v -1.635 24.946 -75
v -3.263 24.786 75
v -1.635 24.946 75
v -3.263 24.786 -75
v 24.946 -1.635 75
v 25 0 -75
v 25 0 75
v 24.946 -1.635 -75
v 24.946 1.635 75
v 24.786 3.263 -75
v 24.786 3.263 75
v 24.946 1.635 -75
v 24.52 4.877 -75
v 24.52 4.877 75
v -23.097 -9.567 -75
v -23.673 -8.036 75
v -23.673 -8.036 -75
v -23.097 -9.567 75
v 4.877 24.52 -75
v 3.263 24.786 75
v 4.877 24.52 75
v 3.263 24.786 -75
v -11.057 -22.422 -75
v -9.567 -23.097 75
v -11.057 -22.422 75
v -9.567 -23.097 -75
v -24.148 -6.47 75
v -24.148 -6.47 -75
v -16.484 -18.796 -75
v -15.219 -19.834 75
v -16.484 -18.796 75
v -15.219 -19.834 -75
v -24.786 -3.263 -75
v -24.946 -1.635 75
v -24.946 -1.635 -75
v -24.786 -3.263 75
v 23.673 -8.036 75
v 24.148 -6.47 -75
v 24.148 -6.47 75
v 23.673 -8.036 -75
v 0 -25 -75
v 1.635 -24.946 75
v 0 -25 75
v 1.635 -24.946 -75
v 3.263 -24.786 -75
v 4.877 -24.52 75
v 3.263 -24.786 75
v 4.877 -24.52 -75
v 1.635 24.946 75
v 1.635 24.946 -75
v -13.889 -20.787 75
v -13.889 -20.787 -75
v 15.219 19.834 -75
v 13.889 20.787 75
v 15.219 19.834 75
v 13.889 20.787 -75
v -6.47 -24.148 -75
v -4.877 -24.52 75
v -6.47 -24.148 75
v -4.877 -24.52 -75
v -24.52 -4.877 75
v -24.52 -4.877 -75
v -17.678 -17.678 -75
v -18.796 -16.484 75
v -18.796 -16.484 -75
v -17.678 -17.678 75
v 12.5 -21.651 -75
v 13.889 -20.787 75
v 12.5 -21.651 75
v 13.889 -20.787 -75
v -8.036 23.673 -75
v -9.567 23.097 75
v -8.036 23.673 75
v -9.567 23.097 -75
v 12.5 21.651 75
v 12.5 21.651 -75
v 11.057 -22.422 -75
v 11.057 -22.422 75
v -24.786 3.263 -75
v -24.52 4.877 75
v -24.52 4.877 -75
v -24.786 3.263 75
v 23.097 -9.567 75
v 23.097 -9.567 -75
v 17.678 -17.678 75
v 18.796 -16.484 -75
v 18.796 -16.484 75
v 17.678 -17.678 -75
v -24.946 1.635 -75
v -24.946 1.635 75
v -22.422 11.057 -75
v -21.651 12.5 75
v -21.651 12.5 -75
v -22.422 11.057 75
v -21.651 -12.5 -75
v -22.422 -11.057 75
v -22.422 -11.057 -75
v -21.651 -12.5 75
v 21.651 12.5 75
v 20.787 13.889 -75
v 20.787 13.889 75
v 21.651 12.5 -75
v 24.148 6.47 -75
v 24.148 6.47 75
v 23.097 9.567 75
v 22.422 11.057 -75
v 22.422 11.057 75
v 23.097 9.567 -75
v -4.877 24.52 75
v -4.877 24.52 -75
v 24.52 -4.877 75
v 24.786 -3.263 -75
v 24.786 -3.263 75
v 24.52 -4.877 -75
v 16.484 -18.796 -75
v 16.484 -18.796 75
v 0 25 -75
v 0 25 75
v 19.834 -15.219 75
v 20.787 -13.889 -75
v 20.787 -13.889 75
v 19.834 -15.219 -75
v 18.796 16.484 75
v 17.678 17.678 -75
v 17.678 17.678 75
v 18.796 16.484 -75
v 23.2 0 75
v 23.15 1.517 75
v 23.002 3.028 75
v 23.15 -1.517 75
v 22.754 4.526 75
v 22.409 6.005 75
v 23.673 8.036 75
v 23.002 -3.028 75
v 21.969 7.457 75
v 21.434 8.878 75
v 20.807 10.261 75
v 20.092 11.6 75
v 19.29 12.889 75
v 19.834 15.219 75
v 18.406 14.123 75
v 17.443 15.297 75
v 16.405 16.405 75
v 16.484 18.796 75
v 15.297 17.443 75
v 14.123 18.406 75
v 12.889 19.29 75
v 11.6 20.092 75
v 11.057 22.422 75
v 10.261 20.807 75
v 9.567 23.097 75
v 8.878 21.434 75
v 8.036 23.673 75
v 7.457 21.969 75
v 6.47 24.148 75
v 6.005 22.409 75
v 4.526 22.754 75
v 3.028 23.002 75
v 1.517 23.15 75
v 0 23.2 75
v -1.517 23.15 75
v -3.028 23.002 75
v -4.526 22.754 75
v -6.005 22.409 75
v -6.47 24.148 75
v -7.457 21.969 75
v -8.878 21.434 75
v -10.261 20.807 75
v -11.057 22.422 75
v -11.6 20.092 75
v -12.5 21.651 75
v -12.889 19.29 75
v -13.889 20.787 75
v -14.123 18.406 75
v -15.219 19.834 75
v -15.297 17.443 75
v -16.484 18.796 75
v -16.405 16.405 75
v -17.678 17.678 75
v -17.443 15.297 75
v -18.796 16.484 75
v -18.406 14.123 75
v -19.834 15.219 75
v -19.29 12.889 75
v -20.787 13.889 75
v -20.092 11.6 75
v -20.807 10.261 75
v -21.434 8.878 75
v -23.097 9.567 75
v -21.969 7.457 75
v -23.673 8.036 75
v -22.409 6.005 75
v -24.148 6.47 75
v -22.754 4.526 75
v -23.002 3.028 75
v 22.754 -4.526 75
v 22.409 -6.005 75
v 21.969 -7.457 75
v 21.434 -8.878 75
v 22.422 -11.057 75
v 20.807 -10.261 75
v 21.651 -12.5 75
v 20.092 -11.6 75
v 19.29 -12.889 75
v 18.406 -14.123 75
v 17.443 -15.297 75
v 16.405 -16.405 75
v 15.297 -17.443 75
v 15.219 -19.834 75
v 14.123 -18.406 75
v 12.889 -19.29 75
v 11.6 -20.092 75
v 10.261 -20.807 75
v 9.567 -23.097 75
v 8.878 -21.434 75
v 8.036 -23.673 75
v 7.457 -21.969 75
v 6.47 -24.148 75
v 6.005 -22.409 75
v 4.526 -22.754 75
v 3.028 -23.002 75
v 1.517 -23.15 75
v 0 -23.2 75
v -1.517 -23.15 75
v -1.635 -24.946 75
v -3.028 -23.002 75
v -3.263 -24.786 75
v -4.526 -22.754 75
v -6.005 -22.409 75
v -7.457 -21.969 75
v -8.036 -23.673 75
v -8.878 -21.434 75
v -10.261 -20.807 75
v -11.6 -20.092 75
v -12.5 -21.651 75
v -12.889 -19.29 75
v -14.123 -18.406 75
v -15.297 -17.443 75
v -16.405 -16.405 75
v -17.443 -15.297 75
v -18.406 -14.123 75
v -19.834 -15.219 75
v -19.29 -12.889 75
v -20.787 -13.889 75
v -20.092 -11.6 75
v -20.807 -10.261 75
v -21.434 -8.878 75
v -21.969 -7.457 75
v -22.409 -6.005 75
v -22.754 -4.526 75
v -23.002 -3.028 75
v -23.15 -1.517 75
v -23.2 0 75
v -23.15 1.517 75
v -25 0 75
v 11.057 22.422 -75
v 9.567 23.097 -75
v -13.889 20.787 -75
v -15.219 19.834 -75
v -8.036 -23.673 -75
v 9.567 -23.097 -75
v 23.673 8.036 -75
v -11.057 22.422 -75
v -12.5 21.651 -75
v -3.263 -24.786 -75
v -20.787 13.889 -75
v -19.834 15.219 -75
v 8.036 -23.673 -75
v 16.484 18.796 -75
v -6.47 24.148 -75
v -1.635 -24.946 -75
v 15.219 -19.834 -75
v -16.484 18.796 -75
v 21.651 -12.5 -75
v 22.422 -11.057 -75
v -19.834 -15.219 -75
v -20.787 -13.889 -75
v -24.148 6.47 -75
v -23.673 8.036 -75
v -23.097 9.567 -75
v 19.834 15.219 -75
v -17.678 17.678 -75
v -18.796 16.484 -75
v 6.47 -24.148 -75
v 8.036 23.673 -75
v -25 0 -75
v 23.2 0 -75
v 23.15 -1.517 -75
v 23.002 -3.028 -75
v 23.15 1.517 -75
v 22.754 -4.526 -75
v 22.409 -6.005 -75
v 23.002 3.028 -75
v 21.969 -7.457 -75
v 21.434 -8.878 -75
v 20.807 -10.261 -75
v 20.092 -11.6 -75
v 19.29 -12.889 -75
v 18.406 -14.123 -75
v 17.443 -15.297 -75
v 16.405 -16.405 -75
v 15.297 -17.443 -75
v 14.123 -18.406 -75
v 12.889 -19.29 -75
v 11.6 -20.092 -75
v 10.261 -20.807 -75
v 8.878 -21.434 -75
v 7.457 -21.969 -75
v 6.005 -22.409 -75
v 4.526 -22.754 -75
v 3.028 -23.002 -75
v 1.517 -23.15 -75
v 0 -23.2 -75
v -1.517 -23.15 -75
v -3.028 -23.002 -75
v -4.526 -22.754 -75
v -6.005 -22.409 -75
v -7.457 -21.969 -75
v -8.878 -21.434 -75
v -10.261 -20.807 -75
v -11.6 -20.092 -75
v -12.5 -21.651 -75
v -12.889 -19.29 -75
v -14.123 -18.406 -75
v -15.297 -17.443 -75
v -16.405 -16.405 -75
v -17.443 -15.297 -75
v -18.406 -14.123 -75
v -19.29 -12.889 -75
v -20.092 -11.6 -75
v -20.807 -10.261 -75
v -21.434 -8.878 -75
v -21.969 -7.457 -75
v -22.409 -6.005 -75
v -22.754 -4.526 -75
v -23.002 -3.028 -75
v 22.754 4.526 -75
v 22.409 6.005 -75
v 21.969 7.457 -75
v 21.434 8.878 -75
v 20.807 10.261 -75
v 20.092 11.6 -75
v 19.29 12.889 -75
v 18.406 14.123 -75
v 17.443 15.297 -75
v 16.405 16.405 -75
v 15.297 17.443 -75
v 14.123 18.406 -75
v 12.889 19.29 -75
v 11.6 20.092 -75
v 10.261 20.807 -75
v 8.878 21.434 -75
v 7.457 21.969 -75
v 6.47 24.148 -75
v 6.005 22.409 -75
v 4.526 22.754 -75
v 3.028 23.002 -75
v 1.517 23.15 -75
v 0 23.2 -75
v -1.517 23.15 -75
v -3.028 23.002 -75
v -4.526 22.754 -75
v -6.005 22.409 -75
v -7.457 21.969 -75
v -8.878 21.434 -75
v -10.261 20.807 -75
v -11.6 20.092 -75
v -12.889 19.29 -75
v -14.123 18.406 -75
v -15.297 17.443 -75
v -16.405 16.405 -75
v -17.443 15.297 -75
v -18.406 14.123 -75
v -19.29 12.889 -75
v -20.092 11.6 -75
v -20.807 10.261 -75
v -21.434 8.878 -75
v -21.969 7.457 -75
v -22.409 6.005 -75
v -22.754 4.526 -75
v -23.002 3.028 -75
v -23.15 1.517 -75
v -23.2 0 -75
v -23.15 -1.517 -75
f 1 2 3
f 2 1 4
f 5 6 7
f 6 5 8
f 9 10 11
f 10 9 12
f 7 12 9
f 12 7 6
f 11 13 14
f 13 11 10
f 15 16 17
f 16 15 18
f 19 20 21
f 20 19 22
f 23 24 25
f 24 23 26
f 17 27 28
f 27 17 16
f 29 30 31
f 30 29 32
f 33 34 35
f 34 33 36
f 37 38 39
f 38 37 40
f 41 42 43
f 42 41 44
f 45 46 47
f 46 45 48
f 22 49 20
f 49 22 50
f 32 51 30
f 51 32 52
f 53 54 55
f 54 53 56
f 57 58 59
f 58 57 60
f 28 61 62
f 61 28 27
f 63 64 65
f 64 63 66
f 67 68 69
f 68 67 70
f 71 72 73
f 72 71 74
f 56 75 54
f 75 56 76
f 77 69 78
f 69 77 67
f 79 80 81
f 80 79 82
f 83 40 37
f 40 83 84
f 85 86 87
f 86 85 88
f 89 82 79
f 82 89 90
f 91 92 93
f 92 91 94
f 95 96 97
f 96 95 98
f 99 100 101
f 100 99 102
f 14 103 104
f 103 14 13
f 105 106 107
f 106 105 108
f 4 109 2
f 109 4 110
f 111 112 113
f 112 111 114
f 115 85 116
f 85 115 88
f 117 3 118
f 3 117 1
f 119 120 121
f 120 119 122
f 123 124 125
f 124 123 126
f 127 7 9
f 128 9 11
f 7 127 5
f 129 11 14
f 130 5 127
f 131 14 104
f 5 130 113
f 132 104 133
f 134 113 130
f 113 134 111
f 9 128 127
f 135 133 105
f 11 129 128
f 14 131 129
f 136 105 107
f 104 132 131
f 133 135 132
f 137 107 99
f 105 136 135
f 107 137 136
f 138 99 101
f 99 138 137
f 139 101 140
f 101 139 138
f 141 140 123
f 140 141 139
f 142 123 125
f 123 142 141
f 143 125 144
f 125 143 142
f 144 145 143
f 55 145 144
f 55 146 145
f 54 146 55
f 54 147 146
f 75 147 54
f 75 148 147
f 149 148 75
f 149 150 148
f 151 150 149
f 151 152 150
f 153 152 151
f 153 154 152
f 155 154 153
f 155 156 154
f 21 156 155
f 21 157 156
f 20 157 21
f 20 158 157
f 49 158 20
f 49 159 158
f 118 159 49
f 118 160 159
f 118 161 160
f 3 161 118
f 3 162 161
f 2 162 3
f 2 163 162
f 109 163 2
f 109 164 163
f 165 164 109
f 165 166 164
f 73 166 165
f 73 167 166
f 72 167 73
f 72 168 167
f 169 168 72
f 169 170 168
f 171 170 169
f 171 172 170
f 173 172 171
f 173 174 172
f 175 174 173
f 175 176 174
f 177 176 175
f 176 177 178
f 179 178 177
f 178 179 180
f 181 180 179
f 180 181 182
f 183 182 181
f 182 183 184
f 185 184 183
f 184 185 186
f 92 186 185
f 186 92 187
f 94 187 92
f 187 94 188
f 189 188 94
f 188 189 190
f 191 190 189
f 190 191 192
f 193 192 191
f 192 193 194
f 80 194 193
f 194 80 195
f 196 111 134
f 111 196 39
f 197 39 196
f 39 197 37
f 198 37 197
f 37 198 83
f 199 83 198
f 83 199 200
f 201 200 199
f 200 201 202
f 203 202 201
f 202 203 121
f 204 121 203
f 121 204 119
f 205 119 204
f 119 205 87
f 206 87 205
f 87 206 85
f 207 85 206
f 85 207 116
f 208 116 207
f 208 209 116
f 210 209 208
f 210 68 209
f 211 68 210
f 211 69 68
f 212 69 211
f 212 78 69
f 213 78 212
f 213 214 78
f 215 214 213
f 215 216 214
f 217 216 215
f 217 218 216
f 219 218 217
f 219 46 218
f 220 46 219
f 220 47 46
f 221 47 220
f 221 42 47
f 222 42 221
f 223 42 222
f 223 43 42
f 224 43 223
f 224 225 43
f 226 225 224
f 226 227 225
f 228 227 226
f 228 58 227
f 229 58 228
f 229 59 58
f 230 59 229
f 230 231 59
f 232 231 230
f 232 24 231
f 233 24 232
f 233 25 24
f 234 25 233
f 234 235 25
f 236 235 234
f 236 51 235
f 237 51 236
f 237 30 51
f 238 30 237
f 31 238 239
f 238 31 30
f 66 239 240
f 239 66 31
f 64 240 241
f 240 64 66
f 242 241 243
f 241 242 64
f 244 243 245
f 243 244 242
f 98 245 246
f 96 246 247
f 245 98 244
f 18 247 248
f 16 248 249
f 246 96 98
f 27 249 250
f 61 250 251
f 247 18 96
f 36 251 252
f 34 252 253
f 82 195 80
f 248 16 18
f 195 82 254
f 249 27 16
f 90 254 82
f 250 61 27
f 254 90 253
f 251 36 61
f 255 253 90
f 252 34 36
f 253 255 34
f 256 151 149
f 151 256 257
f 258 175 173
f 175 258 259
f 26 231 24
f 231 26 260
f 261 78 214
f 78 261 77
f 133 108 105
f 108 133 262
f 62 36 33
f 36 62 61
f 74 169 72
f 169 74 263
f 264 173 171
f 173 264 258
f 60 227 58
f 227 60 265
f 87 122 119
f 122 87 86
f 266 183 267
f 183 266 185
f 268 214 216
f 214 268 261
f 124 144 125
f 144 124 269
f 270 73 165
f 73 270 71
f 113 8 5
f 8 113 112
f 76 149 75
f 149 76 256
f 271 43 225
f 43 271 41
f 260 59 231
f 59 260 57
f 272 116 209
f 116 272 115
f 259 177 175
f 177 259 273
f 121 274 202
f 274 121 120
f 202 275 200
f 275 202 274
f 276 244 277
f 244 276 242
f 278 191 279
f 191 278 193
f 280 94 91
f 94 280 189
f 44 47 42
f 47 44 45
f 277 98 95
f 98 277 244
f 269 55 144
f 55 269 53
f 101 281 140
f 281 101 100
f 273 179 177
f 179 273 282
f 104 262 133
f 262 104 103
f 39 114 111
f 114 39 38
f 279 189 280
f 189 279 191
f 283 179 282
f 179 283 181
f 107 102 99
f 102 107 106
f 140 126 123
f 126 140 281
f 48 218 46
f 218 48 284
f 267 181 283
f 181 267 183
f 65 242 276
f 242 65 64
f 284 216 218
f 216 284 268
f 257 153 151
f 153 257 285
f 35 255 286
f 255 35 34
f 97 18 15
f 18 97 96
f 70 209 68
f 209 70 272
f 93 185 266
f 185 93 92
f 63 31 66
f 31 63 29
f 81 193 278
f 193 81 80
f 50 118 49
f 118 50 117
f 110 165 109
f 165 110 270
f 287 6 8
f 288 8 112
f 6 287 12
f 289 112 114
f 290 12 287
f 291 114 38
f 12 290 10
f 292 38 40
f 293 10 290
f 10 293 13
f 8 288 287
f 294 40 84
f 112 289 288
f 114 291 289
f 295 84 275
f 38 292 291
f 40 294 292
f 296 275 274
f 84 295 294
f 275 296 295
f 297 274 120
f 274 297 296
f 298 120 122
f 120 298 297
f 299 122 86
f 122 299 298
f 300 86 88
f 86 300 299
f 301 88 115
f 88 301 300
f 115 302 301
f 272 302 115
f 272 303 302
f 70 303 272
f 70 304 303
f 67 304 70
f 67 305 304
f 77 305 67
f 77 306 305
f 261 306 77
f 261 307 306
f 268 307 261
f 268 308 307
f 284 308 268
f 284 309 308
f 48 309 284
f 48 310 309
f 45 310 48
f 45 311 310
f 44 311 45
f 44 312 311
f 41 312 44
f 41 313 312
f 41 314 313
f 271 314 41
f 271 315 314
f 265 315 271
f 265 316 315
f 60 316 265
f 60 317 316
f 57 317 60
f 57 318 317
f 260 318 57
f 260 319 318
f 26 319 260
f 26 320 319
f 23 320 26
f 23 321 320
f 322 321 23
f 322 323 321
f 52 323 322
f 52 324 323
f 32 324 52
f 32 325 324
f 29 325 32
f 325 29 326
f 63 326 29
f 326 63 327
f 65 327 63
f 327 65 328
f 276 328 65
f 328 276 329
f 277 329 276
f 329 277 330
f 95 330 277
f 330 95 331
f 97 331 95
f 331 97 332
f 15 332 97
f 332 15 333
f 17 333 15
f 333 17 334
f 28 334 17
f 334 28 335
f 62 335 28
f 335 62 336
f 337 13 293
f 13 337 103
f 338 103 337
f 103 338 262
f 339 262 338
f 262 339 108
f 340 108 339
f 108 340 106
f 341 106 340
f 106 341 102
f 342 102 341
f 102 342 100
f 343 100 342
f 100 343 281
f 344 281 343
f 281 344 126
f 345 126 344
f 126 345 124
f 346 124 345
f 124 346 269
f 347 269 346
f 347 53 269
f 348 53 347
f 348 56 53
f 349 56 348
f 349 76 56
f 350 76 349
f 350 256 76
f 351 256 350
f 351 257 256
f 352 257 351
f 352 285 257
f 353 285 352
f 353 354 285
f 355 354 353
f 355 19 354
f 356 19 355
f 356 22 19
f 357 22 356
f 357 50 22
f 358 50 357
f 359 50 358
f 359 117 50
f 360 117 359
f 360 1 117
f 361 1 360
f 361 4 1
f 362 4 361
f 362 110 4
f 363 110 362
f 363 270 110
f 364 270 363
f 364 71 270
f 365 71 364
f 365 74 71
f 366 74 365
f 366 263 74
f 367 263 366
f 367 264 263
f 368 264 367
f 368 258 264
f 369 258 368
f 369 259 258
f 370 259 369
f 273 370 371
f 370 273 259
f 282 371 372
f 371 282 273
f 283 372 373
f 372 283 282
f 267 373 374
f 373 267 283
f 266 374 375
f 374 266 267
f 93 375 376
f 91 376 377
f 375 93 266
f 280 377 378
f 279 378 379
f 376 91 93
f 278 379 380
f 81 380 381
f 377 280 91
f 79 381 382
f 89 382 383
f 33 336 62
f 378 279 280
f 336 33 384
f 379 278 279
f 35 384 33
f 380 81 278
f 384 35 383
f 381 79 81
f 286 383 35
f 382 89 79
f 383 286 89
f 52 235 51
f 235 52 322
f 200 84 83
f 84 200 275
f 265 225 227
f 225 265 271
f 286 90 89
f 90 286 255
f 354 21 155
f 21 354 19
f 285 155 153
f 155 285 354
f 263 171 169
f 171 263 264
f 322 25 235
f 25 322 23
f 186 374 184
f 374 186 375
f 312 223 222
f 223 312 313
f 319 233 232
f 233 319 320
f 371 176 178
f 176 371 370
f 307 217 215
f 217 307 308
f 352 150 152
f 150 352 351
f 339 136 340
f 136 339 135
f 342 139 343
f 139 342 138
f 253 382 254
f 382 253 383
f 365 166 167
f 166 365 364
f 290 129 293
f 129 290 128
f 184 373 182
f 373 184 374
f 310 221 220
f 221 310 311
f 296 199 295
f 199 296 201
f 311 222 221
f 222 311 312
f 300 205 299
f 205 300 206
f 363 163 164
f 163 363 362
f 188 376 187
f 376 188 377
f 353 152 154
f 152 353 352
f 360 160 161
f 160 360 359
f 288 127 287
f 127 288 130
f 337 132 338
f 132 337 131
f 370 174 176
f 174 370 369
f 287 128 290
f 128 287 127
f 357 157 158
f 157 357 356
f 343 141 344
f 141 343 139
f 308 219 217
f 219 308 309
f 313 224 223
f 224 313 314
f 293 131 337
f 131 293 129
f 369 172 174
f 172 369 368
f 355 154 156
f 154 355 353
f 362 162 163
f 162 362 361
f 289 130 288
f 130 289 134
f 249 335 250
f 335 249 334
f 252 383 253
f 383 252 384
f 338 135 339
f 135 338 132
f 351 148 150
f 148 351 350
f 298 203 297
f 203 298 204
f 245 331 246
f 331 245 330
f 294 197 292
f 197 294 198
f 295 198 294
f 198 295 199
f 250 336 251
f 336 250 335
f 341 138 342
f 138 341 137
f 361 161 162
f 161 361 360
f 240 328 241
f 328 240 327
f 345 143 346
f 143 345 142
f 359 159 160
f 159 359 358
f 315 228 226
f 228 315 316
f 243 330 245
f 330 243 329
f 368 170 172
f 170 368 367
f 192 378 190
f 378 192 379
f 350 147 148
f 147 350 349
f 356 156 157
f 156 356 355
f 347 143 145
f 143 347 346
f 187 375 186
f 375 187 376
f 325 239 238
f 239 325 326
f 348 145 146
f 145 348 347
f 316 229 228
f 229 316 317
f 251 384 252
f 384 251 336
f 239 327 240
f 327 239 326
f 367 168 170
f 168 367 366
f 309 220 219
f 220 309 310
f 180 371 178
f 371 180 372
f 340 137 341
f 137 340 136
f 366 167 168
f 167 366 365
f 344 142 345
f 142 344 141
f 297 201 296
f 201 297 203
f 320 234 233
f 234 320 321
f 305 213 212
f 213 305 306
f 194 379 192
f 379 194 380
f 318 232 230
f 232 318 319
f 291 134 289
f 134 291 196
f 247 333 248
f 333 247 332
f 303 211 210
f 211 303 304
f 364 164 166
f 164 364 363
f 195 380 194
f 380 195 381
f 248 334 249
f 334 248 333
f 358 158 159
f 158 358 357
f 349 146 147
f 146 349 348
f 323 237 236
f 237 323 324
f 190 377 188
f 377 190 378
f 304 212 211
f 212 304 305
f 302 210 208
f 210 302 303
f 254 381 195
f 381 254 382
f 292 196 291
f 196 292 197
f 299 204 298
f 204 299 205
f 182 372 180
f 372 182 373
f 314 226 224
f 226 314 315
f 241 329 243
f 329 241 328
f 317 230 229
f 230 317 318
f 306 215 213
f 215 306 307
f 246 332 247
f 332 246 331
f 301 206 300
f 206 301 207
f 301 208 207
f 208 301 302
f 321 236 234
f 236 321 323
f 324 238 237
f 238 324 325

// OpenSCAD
$fn=96;

module ht_pipe(od=50, length=150, wall=1.8) {
    difference() {
        cylinder(h=length, d=od, center=true);
        cylinder(h=length+0.2, d=od-2*wall, center=true);
    }
}

ht_pipe(od=50, length=150, wall=1.8);
